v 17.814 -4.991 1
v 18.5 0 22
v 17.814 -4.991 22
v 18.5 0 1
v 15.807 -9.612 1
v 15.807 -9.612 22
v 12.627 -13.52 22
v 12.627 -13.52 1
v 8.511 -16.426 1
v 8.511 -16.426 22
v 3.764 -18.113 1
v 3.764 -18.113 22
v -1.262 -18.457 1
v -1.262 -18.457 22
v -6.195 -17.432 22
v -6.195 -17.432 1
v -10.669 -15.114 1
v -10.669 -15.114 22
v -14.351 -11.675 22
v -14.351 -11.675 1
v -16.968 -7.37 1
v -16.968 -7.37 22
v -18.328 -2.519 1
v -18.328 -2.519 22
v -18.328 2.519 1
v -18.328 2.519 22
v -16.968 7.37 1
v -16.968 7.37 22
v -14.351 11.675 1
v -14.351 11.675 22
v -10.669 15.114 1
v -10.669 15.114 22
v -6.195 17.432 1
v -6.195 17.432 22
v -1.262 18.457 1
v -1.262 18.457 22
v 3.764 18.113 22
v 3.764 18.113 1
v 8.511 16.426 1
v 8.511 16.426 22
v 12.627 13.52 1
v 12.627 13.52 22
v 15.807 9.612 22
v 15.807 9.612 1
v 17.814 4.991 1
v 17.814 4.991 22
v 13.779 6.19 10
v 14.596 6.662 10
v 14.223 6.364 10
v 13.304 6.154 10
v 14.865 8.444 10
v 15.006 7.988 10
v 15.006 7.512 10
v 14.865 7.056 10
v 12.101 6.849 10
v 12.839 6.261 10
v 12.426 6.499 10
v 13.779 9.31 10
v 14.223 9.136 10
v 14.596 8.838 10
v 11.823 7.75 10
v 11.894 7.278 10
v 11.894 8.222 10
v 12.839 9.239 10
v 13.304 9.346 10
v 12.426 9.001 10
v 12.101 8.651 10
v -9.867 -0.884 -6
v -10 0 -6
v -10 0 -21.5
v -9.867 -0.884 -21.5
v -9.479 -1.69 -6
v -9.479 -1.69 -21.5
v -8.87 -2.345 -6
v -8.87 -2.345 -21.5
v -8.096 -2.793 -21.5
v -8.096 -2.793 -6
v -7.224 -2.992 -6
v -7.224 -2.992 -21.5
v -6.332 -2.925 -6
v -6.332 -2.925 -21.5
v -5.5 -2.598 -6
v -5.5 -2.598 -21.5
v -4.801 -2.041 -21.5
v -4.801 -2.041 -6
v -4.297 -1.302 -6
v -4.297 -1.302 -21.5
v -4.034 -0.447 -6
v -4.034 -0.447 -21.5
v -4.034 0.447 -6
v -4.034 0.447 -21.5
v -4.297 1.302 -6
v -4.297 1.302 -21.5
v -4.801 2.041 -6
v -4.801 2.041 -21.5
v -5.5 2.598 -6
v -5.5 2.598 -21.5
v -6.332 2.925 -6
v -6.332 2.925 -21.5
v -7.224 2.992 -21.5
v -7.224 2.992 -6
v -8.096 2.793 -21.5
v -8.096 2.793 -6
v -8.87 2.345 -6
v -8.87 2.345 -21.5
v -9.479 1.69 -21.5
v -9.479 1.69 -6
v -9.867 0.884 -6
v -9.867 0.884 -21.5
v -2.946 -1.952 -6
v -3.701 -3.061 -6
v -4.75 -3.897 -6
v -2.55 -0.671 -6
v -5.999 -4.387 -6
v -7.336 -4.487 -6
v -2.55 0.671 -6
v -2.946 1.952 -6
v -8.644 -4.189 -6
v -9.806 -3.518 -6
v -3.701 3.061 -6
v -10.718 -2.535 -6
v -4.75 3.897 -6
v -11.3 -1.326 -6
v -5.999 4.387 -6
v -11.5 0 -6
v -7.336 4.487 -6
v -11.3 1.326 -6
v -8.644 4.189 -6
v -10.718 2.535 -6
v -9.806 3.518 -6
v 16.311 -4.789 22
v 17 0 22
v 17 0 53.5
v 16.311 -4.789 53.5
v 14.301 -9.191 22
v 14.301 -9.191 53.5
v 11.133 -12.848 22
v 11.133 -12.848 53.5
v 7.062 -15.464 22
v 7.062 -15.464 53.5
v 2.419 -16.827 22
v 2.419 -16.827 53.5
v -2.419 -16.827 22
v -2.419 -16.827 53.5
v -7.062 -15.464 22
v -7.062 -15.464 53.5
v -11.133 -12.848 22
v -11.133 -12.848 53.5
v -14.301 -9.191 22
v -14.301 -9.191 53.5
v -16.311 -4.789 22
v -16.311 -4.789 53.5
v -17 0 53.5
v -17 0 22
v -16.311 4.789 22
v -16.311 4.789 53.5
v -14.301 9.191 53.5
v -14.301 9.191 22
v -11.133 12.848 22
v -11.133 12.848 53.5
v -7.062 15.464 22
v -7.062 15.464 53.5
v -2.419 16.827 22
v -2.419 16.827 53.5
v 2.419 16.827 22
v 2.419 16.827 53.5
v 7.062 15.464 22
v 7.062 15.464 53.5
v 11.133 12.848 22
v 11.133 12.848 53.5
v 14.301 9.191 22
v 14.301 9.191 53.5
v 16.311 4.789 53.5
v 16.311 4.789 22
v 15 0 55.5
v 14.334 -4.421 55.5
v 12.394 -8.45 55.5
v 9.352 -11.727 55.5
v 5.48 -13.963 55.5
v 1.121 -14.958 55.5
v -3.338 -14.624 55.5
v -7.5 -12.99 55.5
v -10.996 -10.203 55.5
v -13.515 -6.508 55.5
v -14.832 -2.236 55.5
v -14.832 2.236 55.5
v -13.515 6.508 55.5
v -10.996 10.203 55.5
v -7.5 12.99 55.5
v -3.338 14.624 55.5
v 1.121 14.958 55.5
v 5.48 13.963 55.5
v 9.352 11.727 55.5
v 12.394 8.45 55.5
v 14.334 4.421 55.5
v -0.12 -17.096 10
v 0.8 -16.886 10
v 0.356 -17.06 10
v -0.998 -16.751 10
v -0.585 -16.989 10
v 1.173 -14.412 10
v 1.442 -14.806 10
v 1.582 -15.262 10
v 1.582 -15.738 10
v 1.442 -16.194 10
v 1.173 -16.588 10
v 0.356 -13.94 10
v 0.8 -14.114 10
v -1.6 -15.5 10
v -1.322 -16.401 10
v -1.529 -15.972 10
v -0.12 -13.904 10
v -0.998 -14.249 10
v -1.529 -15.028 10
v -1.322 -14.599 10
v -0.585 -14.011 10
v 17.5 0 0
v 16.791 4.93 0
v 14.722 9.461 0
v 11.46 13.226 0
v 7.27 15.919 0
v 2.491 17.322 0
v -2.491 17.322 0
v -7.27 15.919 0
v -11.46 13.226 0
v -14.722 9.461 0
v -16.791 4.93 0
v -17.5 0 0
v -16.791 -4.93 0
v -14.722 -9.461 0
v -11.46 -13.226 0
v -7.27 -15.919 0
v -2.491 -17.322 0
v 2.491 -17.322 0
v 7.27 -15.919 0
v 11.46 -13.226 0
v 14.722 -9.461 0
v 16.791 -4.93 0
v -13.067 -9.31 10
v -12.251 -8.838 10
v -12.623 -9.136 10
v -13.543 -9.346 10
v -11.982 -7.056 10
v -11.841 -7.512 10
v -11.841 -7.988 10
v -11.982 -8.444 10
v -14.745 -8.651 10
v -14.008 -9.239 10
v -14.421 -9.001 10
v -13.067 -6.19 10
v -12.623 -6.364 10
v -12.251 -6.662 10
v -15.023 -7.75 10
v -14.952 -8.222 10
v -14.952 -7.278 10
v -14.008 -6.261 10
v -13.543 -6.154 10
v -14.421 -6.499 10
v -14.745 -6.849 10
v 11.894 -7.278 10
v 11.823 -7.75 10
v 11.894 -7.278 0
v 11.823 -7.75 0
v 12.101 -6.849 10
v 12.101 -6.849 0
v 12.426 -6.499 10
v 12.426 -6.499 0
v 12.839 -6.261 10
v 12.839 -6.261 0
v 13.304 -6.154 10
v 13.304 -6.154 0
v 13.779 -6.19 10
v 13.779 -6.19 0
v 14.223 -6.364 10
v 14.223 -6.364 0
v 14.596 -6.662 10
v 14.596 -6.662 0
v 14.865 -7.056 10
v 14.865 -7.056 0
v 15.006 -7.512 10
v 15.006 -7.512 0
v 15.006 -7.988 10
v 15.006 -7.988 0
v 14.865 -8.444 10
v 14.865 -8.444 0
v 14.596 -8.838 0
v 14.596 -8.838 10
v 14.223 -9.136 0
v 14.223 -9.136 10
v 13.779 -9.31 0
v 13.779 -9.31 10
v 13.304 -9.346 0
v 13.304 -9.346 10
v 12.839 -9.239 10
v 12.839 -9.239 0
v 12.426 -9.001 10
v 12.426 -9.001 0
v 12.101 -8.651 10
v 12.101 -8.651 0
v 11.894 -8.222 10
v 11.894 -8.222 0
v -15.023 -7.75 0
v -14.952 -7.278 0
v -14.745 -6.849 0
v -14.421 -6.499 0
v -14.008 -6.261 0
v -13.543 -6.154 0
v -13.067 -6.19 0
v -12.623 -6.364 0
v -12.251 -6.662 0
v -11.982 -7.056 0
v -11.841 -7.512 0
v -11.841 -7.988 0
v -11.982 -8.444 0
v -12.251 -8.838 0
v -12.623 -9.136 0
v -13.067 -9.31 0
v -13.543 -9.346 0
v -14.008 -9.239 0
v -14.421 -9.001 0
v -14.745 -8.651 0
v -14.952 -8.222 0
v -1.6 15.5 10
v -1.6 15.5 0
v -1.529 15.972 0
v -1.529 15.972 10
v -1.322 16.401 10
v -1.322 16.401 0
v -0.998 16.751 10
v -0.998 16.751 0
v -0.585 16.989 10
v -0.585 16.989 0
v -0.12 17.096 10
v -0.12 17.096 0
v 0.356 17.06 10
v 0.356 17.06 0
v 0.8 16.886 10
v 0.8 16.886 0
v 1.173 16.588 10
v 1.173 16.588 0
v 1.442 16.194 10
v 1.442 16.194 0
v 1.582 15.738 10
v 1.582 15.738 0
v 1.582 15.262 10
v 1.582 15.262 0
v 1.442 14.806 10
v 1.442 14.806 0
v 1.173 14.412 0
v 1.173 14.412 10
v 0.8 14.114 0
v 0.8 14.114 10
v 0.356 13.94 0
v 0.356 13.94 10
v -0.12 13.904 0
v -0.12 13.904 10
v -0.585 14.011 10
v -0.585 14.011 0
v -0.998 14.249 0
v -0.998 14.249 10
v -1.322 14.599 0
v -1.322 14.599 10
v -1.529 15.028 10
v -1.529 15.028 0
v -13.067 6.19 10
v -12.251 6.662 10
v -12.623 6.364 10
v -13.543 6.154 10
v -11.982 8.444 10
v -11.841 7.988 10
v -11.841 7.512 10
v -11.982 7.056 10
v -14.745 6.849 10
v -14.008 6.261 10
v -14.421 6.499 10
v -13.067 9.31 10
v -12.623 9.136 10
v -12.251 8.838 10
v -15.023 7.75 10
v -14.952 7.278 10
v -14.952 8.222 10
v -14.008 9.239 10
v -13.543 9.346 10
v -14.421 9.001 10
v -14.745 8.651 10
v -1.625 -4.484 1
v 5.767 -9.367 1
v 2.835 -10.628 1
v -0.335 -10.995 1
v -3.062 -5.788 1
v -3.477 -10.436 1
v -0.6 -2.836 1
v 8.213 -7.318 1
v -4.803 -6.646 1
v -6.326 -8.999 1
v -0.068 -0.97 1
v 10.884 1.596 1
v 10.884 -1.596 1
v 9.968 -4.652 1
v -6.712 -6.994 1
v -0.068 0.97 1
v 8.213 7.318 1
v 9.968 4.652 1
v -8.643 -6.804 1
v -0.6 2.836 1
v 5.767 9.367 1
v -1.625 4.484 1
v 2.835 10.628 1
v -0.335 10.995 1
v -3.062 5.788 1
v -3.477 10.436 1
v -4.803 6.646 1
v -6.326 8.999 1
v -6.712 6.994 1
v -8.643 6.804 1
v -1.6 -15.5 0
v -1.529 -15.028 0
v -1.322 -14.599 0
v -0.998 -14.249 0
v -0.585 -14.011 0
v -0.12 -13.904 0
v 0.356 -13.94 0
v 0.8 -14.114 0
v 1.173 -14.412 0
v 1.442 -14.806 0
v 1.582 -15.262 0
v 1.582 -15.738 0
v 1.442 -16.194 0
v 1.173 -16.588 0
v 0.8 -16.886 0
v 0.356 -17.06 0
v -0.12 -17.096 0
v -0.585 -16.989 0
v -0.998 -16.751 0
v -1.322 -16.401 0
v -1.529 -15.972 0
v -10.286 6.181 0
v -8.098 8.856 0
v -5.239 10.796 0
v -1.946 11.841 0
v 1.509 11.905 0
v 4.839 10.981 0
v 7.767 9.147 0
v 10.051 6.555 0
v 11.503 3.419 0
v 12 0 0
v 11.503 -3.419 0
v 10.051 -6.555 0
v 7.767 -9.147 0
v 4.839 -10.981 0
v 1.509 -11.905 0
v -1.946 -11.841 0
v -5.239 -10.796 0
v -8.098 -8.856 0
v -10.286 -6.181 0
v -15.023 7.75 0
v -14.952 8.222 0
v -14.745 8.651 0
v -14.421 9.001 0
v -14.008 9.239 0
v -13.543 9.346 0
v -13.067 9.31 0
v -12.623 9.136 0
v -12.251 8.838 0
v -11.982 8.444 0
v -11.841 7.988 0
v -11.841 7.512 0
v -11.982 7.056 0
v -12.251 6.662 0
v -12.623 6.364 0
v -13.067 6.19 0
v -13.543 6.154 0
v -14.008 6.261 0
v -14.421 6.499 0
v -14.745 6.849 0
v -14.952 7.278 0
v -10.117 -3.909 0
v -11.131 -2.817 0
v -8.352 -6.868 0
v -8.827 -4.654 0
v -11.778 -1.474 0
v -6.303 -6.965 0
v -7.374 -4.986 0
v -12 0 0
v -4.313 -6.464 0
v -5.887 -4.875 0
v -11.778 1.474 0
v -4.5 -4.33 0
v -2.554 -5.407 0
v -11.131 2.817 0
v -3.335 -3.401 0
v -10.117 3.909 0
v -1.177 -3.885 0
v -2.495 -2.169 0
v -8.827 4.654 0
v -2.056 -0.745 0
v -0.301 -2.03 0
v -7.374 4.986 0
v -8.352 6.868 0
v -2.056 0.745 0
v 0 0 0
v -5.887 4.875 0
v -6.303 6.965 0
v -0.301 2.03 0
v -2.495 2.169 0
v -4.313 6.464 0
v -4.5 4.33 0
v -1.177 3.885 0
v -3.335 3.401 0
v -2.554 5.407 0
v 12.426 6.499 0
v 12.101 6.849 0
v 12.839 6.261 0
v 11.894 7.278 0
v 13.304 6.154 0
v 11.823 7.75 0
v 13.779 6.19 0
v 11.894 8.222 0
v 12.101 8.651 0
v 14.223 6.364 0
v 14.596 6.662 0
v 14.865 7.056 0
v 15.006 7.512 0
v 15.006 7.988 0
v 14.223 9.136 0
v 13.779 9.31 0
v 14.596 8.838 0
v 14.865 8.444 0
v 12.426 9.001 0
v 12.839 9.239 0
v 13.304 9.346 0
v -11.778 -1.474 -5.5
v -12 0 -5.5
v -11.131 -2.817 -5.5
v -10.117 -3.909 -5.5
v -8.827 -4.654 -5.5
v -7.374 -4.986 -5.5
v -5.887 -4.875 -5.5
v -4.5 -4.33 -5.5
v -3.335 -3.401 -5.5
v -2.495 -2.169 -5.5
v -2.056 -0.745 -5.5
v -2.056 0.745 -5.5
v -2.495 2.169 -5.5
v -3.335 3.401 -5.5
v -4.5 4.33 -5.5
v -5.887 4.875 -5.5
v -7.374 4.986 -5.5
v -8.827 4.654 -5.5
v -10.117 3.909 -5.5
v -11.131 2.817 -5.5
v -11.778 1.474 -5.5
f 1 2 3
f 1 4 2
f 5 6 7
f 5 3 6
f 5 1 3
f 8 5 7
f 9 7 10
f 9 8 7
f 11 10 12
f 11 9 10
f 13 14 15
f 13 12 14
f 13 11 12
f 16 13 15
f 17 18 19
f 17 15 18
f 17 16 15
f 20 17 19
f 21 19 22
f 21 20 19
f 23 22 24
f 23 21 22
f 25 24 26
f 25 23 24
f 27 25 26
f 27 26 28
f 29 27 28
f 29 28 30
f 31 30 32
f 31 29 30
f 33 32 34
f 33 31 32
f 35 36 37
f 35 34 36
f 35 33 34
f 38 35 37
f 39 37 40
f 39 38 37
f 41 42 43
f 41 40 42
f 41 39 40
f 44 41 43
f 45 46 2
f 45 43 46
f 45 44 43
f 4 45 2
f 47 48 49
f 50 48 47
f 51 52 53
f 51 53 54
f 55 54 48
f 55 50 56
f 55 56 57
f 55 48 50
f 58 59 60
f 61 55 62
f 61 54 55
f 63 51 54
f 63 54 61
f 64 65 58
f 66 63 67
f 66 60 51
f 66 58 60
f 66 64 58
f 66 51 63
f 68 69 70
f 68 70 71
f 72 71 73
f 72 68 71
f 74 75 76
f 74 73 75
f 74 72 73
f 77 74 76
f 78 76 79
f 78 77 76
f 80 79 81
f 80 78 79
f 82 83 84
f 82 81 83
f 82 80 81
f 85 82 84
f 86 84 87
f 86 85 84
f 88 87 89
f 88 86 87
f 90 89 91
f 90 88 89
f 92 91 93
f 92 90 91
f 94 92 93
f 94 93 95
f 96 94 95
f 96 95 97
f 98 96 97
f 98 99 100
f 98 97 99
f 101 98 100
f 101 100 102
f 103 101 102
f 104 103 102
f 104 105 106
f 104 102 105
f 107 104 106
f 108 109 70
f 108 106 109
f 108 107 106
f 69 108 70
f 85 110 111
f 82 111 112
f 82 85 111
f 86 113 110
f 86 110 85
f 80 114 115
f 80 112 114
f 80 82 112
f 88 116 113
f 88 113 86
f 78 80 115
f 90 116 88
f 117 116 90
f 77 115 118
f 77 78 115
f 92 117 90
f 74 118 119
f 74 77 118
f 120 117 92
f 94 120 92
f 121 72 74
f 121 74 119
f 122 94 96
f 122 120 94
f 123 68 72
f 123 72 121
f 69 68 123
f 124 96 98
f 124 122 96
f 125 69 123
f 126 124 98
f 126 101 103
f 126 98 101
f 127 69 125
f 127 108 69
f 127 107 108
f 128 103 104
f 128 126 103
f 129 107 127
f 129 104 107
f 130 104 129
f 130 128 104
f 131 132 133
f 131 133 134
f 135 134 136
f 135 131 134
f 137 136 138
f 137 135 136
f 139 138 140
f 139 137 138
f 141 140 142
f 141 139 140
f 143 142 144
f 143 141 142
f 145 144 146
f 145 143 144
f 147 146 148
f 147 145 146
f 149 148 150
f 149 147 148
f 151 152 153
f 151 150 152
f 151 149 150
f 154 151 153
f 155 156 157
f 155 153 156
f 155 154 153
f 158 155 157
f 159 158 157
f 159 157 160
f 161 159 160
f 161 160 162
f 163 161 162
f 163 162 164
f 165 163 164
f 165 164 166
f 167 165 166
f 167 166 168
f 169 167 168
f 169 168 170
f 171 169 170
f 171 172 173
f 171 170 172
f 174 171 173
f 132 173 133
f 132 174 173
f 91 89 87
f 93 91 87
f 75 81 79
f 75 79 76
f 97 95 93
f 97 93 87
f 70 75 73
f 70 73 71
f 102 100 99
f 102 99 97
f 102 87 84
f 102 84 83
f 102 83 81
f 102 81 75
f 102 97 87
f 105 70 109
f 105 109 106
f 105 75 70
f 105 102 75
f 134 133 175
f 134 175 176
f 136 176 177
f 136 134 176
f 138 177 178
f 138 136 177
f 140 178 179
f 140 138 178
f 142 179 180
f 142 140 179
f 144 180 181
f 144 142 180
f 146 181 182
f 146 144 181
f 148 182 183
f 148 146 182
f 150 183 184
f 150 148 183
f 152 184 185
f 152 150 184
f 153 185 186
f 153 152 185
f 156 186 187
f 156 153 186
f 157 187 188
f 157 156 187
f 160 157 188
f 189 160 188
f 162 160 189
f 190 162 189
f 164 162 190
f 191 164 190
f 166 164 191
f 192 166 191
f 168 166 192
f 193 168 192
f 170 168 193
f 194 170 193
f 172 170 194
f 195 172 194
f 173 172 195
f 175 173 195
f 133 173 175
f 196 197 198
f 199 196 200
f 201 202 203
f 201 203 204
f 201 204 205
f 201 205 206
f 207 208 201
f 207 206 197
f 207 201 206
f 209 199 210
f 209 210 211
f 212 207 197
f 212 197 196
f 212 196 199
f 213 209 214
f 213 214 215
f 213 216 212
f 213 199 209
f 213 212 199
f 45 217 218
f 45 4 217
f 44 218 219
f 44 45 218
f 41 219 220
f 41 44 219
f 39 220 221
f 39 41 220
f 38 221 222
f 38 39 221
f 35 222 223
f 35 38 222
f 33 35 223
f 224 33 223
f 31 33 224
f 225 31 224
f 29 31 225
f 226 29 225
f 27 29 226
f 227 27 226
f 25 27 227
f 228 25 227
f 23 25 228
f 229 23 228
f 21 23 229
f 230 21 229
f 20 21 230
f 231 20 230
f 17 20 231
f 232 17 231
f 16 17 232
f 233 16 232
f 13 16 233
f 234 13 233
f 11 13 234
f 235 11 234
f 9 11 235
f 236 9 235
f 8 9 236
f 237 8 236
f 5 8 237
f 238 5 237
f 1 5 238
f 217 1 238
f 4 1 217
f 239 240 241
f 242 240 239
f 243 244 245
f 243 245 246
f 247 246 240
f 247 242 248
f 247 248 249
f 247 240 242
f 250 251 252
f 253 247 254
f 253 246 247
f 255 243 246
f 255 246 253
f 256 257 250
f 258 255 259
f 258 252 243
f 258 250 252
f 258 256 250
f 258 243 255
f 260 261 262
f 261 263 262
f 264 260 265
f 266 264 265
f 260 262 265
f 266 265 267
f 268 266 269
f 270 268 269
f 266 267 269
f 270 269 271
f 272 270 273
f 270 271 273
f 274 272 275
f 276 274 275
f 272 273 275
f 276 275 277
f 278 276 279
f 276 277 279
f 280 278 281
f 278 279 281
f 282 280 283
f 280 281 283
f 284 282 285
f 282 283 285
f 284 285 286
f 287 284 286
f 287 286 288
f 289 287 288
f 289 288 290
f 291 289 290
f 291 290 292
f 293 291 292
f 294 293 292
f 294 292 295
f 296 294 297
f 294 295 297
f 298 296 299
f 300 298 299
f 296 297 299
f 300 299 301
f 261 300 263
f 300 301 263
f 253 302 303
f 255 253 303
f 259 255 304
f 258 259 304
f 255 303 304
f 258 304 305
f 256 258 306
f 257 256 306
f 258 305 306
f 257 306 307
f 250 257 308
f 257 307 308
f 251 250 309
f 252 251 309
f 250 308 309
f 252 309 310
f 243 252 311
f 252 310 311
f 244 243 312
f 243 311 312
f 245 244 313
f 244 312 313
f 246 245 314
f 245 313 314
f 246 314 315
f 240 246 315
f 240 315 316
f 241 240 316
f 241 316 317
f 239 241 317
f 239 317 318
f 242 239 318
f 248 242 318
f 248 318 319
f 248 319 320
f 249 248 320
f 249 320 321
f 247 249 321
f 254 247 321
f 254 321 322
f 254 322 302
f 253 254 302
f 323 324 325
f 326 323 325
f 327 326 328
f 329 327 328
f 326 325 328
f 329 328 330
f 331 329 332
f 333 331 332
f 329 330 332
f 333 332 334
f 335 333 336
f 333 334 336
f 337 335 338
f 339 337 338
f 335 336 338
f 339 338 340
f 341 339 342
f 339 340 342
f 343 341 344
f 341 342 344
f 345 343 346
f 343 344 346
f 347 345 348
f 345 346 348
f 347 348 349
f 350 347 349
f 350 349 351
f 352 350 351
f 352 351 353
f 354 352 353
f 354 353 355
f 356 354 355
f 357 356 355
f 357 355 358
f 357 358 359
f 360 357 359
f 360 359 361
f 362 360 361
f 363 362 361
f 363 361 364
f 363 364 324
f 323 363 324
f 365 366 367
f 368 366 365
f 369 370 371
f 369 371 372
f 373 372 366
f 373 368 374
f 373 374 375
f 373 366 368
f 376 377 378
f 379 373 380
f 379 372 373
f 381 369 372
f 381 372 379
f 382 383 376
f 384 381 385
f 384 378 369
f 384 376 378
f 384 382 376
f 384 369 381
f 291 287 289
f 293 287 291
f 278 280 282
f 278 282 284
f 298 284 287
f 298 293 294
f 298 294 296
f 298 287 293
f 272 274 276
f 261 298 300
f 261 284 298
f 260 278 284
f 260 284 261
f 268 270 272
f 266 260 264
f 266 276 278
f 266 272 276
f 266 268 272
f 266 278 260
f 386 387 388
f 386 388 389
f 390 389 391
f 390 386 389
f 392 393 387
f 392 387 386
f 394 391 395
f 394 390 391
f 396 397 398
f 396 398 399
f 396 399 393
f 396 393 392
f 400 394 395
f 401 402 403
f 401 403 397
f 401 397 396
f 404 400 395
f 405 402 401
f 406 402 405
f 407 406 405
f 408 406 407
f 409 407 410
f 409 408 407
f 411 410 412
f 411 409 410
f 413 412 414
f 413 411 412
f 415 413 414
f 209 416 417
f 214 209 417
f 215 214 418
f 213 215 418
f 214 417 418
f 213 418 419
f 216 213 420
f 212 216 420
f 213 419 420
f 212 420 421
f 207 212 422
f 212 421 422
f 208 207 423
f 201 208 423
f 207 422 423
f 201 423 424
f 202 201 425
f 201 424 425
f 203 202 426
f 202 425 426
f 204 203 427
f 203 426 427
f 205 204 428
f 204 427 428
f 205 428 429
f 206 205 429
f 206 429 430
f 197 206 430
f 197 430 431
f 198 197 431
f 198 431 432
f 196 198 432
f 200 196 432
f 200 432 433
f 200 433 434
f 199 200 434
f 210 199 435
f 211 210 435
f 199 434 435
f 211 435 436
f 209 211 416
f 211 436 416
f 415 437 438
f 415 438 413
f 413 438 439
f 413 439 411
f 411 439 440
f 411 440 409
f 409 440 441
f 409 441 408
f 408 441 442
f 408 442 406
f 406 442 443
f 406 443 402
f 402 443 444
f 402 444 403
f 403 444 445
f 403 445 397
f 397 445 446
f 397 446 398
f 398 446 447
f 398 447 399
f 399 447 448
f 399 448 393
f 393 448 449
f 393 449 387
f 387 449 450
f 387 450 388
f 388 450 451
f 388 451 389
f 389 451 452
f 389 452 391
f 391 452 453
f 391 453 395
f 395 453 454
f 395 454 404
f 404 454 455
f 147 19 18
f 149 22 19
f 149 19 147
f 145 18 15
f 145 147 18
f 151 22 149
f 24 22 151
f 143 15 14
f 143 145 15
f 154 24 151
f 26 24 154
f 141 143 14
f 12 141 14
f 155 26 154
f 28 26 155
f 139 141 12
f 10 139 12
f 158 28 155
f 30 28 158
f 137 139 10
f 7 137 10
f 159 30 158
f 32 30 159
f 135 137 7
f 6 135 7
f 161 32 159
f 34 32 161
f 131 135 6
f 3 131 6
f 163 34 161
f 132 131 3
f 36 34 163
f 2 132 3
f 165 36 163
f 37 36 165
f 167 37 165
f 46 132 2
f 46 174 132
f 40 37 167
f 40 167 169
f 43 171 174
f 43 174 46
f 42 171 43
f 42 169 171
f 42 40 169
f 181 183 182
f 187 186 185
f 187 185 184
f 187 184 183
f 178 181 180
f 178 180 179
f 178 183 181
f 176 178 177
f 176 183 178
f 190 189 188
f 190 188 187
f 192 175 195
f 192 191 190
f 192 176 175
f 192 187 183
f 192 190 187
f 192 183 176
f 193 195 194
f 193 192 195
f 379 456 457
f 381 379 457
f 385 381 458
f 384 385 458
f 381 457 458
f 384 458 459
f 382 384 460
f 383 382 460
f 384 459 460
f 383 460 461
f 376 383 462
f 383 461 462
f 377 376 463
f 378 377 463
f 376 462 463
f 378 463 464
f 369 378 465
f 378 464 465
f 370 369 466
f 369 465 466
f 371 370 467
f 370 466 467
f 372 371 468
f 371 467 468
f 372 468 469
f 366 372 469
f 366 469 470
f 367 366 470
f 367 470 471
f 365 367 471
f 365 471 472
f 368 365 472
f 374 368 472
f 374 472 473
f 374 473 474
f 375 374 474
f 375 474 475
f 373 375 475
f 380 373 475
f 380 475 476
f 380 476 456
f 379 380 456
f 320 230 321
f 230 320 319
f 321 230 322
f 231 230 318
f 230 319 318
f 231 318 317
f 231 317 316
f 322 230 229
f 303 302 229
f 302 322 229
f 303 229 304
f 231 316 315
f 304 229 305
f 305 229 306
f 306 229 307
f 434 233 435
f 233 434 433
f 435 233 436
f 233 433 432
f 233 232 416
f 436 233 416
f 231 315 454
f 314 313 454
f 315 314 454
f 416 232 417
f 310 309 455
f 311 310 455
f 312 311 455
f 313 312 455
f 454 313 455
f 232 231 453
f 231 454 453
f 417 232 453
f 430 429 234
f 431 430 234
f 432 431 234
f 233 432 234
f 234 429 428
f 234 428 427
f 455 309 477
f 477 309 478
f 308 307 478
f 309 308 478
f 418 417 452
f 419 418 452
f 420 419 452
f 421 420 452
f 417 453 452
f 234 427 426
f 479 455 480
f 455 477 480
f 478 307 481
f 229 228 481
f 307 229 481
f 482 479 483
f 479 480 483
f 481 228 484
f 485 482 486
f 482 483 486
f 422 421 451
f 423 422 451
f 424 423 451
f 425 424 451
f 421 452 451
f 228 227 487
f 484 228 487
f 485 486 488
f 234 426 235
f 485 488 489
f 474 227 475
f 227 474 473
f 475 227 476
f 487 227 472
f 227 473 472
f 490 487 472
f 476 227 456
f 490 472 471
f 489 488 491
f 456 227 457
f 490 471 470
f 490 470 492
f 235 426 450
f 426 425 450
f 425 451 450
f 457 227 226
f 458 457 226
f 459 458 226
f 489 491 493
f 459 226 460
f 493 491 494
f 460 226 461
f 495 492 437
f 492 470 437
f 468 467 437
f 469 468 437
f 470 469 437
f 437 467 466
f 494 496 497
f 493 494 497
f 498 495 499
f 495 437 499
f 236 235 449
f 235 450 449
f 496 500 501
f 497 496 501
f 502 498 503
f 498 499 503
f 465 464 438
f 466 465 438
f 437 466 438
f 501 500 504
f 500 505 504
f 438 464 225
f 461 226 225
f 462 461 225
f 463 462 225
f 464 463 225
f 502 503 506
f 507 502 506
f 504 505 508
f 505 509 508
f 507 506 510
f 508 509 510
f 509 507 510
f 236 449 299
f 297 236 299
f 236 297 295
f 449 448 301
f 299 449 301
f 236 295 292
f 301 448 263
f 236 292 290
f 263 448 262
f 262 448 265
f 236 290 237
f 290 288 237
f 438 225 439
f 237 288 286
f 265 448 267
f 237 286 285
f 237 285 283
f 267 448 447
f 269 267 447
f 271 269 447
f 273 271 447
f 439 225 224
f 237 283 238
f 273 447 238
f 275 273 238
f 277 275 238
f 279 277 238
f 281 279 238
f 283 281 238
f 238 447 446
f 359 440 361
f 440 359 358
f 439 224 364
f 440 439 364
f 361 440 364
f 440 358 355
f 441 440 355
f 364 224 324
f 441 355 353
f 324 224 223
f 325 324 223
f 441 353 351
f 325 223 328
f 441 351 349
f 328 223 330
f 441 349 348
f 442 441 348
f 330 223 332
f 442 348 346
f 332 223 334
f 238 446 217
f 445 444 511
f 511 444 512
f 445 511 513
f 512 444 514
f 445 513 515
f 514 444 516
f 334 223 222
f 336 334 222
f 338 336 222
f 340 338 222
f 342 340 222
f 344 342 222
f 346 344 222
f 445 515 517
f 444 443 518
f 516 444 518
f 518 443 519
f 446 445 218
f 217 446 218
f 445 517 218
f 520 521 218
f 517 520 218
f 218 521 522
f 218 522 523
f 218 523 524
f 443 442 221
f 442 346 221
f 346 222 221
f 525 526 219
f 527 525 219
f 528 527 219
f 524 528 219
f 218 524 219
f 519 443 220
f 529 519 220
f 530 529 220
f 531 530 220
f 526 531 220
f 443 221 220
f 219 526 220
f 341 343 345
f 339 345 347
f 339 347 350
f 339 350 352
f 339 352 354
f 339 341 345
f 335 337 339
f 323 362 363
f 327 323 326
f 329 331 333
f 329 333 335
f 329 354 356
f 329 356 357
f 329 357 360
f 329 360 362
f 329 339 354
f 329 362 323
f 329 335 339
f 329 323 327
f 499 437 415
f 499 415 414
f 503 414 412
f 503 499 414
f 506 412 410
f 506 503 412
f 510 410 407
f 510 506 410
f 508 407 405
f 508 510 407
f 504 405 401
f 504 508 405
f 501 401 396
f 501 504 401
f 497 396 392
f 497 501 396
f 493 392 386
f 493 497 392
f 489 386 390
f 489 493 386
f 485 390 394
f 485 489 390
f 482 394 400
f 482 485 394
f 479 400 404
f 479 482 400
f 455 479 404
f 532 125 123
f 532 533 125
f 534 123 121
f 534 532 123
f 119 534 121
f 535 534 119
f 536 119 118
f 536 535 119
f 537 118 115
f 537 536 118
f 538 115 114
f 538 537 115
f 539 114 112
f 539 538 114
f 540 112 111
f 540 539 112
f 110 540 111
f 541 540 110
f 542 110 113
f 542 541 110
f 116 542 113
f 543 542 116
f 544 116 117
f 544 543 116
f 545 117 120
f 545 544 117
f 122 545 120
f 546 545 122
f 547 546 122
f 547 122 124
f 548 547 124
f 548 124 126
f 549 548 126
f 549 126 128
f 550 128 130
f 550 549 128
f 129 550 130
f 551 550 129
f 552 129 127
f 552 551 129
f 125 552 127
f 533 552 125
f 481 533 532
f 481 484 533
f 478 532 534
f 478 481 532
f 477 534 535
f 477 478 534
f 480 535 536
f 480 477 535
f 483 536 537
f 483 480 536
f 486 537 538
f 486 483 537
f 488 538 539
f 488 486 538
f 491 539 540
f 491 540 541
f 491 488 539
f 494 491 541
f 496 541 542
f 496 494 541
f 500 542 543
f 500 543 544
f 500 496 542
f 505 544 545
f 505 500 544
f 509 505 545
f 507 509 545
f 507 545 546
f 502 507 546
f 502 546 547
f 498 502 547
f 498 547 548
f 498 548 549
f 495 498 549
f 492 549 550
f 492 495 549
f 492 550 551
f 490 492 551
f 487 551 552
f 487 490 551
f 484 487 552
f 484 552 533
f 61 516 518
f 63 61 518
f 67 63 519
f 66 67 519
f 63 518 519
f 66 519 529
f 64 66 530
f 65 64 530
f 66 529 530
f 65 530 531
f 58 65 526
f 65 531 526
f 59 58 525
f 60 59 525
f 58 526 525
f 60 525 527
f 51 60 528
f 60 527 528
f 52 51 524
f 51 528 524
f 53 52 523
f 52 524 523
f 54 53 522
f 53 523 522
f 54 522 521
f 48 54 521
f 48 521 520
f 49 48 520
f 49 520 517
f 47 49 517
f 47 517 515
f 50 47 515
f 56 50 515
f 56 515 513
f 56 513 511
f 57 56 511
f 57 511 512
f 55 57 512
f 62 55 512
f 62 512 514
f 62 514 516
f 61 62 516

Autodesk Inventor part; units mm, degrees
ref_plane "YZ Plane" through (0, 0, 0) normal (1, 0, 0) x (0, 1, 0)
ref_plane "XZ Plane" through (0, 0, 0) normal (0, 1, 0) x (-1, 0, 0)
ref_plane "XY Plane" through (0, 0, 0) normal (0, 0, 1) x (1, 0, 0)
sketch "草图1" plane through (0, 0, 0) normal (0, 0, 1) x (1, 0, 0)
  circle A0 centre (0, 0) radius 18.5
  dimension "d0" = 37
extrude "拉伸1" add sketch "草图1" along normal blind 22
sketch "草图2" plane through (0, 0, 22) normal (0, 0, 1) x (1, 0, 0)
  circle A0 centre (0, 0) radius 17
  dimension "d3" = 34
extrude "拉伸2" add sketch "草图2" along normal blind 33.5
chamfer "倒角1" distance 2 angle 45 1 edges at (-17, 0, 55.5)
sketch "草图3" plane through (0, 0, 0) normal (0, 0, -1) x (-1, 0, 0)
  circle A0 centre (7, 0) radius 5
  line L0 (33.5538, 0) -> (-37.1398, 0)
  point P0 (0, 0)
  dimension "d9" = 10
  dimension "d10" = 7
extrude "拉伸3" add sketch "草图3" along normal blind 6
sketch "草图4" plane through (-7, 0, -6) normal (0, 0, -1) x (-1, 0, 0)
  circle A0 centre (0, 0) radius 5 projected
  circle A1 centre (0, 0) radius 3
  point P0 (-7, 0)
  dimension "d13" = 6
extrude "拉伸4" add sketch "草图4" along normal blind 15.5 contours A1
chamfer "倒角2" distance 0.5 angle 45 1 edges at (-2, 0, -6)
sketch "草图5" plane through (0, 0, 0) normal (0, 0, -1) x (-1, 0, 0)
  circle A0 centre (7, 0) radius 5 projected
  circle A1 centre (7, 0) radius 7
  circle A2 centre (0, 0) radius 11
  point P0 (8.6429, -6.8045)
  point P1 (8.6429, 6.8045)
  dimension "d19" = 22
extrude "拉伸5" cut sketch "草图5" against normal blind 1 contours A1 A2
chamfer "倒角3" distance 1 angle 45 2 edges at (11, 0, 0) (-18.5, 0, 0)
sketch "草图6" plane through (0, 0, 0) normal (0, 0, -1) x (-1, 0, 0)
  circle A0 centre (0, 0) radius 15.5 construction
  circle A1 centre (0, 15.5) radius 1.6
  line L0 (0, 15.5) -> (0, 0) construction
  arc A2 (10.2857, 6.1809) -> (10.2857, -6.1809) centre (7, 0) ccw projected
  circle A3 centre (-13.4234, 7.75) radius 1.6
  circle A4 centre (-13.4234, -7.75) radius 1.6
  circle A5 centre (0, -15.5) radius 1.6
  circle A6 centre (13.4234, -7.75) radius 1.6
  circle A7 centre (13.4234, 7.75) radius 1.6
  dimension "d25" = 31
  dimension "d26" = 3.2
  dimension "d29" = 360
extrude "拉伸6" cut sketch "草图6" against normal blind 10
properties part number "JGB37-520"
